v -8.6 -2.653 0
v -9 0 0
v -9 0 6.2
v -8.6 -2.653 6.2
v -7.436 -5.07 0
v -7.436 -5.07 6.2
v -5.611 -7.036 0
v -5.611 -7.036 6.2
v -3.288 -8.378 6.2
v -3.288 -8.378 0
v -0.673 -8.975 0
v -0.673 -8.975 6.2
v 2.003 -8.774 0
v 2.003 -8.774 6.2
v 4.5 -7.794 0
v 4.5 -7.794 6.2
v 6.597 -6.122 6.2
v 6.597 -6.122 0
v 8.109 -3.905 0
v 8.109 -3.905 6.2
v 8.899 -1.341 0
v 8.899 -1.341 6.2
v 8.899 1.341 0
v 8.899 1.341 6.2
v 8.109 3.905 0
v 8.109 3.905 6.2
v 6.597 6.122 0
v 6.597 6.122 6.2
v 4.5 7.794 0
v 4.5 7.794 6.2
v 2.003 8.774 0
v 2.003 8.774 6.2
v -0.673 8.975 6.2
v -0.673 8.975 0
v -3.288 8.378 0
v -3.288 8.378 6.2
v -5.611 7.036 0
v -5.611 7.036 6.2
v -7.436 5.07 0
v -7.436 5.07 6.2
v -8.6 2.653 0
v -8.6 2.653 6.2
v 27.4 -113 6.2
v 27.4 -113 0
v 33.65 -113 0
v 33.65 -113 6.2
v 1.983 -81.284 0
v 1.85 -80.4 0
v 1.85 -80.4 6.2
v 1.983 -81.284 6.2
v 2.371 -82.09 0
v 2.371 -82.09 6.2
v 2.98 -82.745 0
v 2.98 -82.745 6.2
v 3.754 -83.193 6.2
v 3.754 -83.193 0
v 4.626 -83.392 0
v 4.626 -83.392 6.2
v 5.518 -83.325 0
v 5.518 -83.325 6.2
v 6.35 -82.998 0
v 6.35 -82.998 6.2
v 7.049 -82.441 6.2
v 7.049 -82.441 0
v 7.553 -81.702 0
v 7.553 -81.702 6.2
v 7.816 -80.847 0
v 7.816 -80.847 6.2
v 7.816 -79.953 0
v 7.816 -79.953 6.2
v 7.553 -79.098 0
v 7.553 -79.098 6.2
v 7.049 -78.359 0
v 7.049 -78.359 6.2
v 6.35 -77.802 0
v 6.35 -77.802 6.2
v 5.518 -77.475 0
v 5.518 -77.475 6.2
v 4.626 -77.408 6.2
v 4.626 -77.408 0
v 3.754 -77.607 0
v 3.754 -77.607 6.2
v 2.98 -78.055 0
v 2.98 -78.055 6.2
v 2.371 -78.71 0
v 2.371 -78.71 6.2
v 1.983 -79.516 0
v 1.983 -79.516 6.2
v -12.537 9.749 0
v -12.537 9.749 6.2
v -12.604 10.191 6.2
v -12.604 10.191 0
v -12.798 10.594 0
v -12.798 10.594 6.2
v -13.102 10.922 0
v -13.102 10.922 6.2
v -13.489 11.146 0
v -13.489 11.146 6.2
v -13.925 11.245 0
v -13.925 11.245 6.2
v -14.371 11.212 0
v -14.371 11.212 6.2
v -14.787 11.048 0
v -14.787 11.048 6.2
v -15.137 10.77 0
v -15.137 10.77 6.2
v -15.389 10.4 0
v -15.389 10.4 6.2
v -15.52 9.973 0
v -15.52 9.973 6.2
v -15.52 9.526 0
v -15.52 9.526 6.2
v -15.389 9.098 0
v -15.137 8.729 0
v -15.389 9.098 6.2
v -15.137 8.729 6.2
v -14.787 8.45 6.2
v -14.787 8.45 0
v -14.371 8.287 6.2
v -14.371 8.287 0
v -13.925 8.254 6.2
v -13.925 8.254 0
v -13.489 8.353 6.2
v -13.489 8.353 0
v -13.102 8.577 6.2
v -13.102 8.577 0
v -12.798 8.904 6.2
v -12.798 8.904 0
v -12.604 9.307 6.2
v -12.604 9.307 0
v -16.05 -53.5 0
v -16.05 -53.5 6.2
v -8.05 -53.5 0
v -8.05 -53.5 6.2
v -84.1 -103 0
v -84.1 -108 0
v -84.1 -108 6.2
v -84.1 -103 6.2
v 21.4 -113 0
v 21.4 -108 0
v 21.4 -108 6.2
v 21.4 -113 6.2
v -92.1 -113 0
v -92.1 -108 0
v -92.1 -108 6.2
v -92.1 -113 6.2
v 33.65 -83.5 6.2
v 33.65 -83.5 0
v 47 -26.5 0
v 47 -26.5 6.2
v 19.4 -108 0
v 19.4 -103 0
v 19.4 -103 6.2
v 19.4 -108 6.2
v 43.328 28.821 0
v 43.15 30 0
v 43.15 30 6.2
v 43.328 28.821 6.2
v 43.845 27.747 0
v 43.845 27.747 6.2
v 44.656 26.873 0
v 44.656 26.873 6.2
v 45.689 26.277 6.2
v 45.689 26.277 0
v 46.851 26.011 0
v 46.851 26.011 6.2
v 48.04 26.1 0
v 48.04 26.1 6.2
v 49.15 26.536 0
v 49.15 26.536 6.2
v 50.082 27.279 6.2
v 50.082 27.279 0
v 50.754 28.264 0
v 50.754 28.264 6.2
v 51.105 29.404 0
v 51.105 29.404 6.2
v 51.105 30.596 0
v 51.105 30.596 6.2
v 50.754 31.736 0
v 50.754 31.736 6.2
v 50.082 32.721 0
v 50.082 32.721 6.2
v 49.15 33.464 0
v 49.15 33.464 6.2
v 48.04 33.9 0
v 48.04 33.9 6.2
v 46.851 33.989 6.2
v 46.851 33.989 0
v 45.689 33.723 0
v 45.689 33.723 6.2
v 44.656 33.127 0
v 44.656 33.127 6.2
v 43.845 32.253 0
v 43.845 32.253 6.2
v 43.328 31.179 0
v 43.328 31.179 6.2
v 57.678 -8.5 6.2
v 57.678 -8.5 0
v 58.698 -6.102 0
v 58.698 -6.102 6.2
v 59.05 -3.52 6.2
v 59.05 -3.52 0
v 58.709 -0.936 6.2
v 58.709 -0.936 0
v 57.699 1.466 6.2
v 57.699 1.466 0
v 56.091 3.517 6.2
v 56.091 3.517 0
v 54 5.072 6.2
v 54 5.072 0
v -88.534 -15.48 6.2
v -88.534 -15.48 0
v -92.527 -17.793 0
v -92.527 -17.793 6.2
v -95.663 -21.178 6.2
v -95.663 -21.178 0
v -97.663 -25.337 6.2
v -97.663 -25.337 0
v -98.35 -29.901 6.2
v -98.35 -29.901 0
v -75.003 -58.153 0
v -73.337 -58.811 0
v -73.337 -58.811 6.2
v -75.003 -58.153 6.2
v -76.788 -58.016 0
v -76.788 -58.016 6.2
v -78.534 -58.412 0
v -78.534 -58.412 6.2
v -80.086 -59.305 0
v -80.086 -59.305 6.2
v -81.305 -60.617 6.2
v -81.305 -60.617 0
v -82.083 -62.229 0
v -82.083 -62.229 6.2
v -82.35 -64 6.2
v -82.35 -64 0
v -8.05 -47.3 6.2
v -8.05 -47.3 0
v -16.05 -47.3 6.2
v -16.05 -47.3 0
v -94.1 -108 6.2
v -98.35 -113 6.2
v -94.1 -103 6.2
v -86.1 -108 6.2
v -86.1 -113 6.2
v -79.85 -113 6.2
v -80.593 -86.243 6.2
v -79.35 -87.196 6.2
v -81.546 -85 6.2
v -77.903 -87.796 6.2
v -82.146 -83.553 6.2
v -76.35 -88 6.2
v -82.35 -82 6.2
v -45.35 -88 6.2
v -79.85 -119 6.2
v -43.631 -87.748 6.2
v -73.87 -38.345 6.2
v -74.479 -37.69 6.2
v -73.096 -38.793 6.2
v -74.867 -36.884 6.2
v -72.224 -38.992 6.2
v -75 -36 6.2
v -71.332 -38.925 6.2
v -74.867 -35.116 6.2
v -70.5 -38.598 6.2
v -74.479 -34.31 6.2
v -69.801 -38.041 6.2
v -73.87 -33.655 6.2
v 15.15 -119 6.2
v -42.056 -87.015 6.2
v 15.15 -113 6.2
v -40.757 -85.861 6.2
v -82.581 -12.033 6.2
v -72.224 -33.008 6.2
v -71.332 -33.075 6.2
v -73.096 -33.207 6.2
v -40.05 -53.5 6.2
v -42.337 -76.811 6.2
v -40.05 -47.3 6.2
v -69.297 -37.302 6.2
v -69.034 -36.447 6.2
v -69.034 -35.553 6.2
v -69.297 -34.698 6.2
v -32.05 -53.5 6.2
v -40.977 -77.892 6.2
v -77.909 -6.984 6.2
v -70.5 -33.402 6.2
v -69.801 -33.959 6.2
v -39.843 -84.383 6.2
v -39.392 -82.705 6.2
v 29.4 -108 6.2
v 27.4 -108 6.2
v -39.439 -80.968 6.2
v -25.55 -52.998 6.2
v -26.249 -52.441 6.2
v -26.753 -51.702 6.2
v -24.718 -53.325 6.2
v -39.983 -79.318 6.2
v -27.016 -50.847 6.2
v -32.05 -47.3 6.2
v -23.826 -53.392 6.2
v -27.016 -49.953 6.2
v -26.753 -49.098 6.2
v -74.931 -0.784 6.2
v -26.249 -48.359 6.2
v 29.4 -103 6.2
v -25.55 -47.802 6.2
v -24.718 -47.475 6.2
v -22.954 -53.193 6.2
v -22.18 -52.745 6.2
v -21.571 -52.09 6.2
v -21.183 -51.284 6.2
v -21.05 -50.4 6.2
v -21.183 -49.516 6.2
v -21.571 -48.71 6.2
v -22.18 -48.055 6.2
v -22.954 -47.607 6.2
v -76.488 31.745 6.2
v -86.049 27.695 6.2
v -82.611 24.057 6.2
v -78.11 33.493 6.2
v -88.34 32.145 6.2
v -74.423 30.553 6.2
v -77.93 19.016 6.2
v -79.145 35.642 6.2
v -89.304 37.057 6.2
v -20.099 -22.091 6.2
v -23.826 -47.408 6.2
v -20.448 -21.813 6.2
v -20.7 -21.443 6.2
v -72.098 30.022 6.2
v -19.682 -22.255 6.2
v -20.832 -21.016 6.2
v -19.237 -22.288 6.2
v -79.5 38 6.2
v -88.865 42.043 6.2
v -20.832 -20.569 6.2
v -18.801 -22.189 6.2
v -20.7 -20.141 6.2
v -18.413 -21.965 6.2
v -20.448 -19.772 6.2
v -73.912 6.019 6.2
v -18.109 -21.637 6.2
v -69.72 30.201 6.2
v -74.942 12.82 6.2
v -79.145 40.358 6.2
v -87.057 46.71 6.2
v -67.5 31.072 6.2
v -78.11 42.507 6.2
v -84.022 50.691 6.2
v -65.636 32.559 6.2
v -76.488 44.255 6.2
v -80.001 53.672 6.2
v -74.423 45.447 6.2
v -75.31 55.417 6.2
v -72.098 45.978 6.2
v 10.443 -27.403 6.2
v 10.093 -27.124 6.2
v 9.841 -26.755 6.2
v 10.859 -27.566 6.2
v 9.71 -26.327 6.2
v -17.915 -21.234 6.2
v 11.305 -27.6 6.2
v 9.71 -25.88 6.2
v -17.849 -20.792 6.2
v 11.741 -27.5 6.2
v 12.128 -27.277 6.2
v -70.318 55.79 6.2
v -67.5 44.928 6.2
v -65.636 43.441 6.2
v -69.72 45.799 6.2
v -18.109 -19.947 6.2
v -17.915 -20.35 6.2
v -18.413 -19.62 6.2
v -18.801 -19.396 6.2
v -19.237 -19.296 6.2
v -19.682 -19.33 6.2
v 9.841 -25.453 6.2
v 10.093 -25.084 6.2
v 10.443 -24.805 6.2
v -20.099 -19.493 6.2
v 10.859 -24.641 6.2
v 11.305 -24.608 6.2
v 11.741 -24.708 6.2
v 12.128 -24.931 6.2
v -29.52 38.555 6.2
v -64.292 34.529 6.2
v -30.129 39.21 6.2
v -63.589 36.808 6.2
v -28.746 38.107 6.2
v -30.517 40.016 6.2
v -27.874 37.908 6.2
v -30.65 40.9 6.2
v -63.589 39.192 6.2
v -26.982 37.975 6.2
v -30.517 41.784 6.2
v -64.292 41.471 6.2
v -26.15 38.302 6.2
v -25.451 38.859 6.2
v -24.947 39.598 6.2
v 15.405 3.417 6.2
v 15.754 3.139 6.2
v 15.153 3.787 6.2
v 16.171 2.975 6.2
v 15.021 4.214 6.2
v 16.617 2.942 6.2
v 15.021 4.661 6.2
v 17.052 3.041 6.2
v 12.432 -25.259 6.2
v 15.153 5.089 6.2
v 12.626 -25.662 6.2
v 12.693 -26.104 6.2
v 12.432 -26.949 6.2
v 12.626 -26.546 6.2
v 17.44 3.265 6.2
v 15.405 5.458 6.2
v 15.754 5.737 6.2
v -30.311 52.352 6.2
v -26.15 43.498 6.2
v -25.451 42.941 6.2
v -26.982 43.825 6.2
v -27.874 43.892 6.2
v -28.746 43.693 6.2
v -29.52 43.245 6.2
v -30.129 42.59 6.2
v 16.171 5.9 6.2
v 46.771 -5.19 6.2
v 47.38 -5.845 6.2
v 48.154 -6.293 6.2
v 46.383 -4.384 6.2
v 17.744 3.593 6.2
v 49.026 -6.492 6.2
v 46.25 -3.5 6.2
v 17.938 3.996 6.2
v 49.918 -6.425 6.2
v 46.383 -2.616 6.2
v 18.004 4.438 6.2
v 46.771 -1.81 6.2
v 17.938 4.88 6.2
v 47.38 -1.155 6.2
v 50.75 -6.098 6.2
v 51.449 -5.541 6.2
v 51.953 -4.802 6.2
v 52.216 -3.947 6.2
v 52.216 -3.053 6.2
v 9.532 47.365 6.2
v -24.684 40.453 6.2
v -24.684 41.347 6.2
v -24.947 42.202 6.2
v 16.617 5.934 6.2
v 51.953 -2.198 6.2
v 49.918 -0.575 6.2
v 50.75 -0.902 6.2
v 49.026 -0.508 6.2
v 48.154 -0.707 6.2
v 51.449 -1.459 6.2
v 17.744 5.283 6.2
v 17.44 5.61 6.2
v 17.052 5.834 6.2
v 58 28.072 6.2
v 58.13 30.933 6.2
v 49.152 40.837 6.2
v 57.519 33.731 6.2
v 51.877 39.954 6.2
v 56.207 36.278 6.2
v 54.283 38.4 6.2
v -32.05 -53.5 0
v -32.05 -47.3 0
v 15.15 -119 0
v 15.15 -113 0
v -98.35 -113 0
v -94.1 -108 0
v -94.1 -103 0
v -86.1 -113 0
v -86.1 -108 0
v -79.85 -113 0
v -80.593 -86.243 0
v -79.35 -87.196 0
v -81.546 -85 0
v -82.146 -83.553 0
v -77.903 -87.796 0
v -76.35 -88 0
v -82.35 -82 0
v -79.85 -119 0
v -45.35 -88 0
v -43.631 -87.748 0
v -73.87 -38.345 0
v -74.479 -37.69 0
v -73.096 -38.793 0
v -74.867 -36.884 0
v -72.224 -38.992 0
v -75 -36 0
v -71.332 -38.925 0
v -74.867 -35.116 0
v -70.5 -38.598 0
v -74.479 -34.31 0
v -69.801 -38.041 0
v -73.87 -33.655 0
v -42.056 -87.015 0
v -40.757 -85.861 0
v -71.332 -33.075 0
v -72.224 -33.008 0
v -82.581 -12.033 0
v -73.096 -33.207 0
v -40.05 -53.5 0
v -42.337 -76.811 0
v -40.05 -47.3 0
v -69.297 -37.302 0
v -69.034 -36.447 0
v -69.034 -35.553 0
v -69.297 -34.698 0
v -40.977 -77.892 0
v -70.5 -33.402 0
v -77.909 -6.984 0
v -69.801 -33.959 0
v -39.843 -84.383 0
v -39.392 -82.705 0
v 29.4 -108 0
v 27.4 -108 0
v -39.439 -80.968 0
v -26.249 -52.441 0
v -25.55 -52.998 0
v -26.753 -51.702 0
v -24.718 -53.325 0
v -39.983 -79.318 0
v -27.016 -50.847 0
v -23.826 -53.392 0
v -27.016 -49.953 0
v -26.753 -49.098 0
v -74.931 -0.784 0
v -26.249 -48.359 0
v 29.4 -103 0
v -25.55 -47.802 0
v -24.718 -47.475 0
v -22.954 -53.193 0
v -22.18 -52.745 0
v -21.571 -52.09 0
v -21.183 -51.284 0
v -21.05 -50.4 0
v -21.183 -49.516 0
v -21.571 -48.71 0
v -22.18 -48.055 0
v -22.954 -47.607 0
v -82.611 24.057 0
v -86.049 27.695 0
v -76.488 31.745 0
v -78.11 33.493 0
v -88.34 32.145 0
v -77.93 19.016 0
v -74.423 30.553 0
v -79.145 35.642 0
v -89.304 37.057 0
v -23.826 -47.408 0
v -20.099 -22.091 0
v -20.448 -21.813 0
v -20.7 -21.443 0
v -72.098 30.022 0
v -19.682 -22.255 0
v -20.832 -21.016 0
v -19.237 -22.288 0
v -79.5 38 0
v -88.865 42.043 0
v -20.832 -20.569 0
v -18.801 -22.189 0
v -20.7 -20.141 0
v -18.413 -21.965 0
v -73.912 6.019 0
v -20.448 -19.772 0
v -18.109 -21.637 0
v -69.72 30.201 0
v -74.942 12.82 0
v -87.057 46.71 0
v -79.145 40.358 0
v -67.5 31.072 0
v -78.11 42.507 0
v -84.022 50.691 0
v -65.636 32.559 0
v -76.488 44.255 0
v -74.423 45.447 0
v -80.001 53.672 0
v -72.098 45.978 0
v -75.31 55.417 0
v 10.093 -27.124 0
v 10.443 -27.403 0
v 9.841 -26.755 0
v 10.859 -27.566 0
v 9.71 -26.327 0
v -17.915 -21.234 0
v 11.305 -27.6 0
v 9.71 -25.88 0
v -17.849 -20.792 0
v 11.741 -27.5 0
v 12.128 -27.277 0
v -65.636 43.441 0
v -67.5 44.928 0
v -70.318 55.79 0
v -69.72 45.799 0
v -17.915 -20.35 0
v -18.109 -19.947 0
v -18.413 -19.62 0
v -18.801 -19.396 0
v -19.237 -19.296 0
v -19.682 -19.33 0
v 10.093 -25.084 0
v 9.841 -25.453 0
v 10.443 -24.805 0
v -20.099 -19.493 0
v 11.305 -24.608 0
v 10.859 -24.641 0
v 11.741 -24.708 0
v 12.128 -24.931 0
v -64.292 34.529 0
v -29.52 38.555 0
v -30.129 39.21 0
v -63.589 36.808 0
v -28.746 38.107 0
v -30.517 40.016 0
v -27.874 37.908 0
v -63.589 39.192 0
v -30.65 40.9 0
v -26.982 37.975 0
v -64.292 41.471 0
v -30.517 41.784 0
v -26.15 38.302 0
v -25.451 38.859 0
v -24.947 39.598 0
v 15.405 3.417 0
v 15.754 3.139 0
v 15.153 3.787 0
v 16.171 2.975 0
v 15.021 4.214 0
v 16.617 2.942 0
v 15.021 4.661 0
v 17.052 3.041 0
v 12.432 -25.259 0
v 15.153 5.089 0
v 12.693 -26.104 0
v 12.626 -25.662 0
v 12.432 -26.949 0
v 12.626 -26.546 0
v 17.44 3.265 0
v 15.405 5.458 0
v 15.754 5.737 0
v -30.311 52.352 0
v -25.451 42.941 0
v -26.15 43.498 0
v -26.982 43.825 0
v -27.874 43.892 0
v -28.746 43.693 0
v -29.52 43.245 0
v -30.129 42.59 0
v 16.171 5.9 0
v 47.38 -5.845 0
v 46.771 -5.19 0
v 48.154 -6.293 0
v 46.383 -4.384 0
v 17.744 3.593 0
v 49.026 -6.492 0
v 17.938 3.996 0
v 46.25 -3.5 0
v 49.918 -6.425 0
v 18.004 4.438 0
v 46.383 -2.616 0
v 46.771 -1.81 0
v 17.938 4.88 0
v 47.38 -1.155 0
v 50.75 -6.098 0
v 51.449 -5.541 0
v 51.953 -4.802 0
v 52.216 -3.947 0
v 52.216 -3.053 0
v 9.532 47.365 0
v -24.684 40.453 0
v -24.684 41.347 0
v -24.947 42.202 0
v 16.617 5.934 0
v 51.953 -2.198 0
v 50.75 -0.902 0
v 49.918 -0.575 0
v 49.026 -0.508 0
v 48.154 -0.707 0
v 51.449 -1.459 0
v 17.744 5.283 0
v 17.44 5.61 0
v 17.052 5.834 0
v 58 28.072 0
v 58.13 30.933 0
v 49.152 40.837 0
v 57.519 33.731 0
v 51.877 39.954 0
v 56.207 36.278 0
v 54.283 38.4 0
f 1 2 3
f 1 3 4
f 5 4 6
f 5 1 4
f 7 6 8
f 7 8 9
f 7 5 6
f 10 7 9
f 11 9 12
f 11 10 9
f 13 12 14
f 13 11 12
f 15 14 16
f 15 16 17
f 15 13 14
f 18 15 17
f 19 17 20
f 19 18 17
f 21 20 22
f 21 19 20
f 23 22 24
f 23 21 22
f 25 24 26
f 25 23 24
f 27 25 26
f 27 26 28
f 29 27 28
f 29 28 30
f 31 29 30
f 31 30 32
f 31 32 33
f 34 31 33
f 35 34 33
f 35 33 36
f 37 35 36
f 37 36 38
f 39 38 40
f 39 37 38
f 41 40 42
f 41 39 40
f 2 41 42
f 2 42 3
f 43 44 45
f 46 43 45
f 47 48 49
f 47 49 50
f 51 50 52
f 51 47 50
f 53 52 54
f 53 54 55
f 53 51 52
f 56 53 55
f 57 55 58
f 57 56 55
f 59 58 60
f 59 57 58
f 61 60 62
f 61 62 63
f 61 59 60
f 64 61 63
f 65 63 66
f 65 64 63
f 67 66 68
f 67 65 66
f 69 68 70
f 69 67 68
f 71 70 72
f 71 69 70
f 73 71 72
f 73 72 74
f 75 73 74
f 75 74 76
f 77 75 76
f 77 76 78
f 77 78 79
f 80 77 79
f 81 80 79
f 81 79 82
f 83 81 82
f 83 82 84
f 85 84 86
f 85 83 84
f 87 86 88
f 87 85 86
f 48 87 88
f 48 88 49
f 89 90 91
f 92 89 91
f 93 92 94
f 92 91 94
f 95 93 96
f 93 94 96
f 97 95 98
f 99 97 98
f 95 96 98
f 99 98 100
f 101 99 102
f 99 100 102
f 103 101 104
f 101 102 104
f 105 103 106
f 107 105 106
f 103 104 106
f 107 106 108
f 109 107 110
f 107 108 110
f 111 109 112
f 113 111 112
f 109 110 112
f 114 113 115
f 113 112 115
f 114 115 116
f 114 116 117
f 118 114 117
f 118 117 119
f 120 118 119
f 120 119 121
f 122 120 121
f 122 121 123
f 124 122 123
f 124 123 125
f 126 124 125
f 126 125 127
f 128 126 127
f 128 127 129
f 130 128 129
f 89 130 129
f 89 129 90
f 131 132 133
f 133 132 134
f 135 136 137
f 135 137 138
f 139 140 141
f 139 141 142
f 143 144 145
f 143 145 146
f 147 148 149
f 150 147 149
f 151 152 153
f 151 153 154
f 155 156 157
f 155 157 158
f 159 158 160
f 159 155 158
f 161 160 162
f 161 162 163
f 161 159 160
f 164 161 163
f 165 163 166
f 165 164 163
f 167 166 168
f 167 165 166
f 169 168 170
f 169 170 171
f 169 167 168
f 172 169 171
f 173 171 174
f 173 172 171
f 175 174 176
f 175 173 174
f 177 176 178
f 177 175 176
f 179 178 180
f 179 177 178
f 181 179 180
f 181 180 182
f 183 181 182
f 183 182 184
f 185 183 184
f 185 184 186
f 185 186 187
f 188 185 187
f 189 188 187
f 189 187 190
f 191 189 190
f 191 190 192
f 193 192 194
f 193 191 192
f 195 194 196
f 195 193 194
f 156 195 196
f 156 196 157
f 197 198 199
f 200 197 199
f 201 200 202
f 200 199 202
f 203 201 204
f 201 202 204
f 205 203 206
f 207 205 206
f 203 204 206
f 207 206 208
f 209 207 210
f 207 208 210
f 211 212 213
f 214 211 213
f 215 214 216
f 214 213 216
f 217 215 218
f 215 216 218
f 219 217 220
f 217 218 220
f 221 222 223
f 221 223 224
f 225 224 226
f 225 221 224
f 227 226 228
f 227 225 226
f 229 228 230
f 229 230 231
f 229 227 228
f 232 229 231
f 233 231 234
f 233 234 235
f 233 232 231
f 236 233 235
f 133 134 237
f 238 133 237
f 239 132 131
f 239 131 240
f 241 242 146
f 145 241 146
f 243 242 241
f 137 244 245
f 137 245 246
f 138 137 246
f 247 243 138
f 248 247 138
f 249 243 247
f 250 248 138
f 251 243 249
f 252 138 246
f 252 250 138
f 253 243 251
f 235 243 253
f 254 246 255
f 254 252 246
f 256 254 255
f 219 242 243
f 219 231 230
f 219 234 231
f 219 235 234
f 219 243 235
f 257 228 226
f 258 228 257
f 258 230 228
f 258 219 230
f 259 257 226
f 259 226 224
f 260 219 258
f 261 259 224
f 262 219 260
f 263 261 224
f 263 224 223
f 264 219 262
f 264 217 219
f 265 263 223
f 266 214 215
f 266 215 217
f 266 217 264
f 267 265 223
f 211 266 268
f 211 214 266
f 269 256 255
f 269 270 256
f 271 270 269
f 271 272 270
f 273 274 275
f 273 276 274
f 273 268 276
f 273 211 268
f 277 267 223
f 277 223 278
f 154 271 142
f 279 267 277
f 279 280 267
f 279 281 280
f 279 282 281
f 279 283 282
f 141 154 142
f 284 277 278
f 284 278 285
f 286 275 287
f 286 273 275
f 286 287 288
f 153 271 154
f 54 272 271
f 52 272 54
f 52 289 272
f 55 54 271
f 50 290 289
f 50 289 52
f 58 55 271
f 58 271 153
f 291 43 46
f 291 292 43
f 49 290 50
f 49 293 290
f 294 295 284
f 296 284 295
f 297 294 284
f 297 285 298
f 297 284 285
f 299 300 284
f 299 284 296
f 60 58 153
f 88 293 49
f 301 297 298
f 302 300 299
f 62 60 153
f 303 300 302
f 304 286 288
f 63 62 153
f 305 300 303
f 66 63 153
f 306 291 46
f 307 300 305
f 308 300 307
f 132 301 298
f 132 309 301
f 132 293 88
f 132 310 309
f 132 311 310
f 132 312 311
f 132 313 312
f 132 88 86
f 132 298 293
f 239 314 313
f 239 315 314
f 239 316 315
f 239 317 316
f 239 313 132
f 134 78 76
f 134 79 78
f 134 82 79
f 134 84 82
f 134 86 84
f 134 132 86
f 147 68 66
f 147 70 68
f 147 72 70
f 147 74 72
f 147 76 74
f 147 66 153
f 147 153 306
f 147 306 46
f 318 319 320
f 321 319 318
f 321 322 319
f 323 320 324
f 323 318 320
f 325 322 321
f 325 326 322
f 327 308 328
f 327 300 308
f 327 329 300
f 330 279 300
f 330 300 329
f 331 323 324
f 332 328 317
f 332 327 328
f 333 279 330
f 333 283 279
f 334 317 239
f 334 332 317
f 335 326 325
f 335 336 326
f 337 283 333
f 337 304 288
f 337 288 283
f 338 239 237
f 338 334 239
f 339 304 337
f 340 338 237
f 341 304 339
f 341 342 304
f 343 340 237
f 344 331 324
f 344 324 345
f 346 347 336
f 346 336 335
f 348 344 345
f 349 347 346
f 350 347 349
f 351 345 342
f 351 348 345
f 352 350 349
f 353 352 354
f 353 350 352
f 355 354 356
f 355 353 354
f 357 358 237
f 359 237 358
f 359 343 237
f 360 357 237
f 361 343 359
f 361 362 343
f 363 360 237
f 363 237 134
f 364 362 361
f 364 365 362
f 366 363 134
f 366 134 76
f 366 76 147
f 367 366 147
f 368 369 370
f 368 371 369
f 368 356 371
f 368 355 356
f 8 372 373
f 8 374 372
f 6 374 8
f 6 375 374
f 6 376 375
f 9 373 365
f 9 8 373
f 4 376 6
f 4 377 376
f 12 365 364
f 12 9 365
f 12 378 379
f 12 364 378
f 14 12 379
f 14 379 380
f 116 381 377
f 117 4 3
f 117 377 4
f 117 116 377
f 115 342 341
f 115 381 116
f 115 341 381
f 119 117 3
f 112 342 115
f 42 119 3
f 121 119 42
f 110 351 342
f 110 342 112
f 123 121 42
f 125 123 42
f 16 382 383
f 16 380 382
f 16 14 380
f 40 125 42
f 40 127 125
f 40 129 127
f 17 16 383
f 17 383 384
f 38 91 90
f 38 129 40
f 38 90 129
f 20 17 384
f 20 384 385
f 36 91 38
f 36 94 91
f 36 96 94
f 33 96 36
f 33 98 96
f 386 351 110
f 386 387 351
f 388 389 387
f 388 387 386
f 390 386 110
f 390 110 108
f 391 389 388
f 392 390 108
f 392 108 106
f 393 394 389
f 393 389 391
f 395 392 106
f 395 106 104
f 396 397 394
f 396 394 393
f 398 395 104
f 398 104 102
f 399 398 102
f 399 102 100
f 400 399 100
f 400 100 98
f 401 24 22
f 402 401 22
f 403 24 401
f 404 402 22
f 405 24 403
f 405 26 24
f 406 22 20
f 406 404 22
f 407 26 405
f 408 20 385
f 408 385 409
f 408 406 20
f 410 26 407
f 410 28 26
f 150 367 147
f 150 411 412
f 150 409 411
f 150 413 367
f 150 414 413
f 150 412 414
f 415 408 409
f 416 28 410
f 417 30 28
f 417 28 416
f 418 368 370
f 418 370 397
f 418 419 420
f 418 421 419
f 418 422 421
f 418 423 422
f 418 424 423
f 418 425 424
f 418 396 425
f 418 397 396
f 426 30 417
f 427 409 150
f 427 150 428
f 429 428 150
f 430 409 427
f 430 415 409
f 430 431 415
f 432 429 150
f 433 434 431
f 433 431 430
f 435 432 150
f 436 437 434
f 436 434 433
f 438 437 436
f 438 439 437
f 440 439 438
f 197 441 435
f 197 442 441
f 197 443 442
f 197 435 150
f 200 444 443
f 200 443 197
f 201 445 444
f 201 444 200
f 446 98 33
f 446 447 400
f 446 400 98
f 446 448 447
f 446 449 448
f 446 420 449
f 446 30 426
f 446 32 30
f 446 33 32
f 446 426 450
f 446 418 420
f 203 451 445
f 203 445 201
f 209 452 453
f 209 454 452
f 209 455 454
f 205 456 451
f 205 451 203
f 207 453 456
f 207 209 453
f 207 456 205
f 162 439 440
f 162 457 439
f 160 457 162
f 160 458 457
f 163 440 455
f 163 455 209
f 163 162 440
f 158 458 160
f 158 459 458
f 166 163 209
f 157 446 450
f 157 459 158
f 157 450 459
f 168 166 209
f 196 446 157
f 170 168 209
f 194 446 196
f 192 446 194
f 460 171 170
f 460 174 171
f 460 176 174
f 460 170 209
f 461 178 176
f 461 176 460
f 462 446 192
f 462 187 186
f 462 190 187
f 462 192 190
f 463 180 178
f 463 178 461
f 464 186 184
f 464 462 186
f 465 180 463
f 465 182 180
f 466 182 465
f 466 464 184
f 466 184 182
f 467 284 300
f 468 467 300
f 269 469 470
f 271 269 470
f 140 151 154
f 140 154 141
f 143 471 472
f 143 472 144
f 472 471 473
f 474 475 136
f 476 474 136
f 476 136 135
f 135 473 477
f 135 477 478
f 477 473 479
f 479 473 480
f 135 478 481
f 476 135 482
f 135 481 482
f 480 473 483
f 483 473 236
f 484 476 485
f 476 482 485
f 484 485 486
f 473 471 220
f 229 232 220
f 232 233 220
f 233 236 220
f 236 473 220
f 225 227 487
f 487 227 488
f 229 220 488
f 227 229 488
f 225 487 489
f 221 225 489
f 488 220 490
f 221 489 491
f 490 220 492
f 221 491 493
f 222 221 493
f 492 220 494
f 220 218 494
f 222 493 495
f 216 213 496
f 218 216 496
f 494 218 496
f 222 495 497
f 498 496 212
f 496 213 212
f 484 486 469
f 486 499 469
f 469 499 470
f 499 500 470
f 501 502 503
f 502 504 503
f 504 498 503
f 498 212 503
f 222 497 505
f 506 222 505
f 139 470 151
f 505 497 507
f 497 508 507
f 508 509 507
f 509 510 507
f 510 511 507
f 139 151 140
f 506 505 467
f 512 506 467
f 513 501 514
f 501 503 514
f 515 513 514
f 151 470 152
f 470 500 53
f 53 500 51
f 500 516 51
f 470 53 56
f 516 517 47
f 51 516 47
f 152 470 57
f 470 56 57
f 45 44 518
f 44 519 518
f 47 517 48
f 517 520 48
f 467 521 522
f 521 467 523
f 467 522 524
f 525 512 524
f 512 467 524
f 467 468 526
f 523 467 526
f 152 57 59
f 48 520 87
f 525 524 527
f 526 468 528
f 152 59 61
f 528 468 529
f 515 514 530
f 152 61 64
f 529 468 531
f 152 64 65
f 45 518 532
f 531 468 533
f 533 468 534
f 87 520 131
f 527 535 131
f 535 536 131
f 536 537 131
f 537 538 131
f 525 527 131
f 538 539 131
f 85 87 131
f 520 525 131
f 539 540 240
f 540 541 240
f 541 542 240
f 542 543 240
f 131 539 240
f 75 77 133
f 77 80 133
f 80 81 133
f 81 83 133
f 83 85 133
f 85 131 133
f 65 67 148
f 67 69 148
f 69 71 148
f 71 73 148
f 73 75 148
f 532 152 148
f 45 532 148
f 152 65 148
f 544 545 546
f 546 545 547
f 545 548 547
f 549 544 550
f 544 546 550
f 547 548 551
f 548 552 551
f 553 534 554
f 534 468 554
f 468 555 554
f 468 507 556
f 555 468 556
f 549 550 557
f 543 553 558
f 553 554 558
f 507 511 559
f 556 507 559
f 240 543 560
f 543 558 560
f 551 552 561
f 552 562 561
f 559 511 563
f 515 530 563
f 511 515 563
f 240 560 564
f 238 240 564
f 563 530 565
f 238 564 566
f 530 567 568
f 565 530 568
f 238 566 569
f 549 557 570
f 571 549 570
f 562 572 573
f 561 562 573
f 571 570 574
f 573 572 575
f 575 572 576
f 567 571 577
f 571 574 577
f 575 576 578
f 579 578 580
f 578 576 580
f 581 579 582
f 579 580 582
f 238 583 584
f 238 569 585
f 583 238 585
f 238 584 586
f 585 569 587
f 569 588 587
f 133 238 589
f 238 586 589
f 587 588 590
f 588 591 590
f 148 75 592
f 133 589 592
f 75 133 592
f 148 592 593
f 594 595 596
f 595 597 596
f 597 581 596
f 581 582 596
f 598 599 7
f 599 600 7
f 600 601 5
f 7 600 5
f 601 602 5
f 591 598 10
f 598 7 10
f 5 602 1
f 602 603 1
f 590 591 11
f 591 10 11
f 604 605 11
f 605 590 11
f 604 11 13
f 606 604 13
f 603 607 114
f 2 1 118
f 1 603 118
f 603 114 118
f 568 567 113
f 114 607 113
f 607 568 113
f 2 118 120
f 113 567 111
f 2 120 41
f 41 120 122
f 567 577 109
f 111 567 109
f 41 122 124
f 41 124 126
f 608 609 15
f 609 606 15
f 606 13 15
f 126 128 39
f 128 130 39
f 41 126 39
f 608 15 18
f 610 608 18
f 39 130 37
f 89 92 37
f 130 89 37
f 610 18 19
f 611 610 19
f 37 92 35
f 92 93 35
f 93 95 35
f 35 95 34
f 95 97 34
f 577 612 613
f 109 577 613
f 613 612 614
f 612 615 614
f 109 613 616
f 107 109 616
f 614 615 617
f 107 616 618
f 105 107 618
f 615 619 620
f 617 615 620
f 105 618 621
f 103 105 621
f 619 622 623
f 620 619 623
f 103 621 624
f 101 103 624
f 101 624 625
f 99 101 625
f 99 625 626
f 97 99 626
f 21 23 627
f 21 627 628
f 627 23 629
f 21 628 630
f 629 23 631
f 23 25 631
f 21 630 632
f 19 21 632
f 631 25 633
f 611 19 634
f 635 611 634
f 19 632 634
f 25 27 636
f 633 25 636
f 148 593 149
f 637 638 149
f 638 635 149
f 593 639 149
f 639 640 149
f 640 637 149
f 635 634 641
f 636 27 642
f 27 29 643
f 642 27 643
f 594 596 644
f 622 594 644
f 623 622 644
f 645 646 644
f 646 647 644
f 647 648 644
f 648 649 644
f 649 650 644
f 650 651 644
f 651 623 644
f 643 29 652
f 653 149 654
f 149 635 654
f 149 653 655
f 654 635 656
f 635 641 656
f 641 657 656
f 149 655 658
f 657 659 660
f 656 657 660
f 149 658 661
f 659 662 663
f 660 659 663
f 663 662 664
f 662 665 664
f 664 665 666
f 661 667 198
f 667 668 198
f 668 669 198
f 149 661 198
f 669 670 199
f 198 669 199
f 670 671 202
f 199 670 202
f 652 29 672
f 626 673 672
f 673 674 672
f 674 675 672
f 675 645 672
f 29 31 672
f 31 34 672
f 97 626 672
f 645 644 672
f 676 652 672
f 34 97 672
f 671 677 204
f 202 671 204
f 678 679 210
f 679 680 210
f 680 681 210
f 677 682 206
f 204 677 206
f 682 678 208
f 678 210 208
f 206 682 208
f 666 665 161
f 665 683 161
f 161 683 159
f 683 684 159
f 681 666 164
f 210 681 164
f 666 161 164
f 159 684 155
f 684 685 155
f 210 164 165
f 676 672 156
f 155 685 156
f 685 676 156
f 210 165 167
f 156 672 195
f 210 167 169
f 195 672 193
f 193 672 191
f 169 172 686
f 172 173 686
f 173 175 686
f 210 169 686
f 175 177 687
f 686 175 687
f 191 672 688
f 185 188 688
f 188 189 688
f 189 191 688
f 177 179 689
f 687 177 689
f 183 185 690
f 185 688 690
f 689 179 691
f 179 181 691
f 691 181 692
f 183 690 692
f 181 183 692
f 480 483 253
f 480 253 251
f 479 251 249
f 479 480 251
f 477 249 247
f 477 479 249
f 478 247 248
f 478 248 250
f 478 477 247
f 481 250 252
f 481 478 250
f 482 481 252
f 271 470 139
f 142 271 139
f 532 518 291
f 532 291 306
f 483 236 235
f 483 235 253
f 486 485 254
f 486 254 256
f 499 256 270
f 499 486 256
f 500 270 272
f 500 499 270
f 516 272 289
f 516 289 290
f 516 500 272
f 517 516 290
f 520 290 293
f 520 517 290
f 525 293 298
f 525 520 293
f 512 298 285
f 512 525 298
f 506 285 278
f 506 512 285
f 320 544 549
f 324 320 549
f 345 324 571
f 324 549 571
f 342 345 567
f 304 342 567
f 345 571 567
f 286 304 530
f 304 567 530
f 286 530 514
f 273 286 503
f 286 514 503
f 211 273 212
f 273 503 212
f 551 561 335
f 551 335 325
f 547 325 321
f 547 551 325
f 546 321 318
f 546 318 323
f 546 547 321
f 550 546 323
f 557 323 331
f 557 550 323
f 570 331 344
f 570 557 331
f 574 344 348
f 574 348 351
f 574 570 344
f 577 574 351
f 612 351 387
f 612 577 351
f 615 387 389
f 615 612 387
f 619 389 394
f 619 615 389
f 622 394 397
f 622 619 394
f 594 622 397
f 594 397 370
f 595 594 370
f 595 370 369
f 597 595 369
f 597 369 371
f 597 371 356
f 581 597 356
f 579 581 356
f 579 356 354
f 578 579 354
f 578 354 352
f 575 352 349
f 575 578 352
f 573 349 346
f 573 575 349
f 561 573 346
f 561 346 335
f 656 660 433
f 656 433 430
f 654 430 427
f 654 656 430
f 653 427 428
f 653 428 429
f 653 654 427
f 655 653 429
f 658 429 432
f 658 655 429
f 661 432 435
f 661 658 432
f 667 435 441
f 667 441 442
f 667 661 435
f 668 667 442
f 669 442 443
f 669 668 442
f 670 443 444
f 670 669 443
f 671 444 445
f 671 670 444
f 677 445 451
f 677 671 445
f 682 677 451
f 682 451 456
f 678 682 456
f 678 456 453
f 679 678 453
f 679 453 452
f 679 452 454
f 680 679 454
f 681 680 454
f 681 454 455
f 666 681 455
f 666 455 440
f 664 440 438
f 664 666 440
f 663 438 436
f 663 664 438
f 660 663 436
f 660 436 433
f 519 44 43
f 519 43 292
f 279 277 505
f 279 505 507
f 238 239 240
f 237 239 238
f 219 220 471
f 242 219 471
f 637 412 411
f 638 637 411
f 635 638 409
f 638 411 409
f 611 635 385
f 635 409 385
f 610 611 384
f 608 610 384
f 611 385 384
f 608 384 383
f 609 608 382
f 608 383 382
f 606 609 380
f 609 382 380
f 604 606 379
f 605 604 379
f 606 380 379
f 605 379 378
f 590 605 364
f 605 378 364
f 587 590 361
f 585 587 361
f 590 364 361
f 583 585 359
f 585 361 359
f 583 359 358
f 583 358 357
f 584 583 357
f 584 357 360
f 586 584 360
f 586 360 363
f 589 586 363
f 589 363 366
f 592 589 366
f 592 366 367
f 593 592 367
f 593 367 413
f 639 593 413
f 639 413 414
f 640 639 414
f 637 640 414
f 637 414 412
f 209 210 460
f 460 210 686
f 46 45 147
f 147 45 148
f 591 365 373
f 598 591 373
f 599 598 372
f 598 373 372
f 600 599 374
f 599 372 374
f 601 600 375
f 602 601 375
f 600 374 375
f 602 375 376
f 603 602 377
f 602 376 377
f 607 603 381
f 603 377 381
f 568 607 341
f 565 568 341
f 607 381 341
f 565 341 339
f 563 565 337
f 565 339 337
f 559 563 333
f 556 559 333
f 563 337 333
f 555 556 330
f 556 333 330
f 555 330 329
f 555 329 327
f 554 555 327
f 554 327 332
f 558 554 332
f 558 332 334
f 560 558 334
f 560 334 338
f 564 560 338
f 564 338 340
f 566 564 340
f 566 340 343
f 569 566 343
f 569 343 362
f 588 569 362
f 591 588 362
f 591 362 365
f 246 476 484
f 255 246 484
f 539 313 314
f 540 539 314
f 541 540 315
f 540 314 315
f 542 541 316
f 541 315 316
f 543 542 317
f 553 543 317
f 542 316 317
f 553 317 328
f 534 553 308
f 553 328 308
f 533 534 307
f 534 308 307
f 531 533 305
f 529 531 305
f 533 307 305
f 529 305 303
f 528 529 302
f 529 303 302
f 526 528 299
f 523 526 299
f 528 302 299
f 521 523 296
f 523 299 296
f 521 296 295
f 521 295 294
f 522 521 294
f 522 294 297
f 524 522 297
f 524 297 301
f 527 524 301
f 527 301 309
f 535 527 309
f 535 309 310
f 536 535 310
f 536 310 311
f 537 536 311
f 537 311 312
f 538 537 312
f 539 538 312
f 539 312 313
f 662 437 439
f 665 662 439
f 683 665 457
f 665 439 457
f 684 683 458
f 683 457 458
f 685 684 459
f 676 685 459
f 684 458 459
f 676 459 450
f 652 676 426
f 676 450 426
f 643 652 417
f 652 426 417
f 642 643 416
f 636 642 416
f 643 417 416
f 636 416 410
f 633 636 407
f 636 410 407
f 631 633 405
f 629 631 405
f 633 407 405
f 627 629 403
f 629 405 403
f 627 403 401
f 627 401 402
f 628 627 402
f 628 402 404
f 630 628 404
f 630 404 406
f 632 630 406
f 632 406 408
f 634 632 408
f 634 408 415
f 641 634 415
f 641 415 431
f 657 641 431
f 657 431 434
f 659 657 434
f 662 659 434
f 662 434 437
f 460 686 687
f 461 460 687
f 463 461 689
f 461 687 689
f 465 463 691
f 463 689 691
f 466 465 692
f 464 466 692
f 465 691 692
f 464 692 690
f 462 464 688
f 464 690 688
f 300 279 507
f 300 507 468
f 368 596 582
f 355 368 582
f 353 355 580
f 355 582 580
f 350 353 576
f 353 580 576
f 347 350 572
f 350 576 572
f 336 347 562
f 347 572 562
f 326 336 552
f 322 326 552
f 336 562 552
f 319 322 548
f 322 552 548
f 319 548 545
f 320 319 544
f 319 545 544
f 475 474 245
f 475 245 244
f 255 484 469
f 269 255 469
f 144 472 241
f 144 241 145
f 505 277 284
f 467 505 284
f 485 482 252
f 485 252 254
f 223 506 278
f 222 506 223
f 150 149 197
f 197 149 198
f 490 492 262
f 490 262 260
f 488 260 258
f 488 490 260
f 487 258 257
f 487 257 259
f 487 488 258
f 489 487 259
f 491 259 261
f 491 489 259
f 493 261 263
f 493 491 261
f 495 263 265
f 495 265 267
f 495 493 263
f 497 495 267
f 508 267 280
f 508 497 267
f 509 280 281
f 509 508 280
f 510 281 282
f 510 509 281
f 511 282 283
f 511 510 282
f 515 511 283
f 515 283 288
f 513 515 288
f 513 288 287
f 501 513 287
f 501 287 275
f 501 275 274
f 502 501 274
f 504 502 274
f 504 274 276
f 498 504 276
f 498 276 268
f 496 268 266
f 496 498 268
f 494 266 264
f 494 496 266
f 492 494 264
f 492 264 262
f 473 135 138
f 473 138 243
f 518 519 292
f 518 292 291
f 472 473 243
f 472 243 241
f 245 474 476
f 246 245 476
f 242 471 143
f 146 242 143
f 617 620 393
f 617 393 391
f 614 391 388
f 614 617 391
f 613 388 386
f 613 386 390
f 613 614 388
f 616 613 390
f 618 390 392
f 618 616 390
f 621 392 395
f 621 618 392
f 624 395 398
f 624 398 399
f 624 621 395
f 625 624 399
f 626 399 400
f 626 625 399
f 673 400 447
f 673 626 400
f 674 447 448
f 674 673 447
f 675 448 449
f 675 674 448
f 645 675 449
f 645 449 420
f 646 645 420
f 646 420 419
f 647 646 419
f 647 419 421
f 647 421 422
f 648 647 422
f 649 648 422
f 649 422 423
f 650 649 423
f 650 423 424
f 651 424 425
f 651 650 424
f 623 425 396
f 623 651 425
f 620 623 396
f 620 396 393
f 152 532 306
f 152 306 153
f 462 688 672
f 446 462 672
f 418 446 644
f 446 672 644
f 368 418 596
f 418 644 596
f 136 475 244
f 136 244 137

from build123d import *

# Parameters (mm, degrees)
SKETCH1_R           = 4
SKETCH1_R_2         = 8
SKETCH1_R_3         = 3
SKETCH1_R_4         = 9
BOSS_EXTRUDE1_DEPTH = 6.2
CUT_EXTRUDE1_REACH  = 156.506
SKETCH2_R           = 1.5
CUT_EXTRUDE2_REACH  = 156.506
CUT_EXTRUDE3_REACH  = 156.506
SKETCH4_R           = 3
SKETCH4_W           = 8
SKETCH4_H           = 6.2


with BuildPart() as part:
    # Sketch1 → Boss-Extrude1 (new body)
    with BuildSketch(Plane.XY):
        with BuildLine():
            Line((33.65, -83.5), (47, -26.5))
            Line((47, -26.5), (57.678304402, -8.5))
            ThreePointArc((57.678304402, -8.5), (58.708572703, -0.936463864), (54, 5.071686829))
            Line((54, 5.071686829), (58, 28.071686829))
            ThreePointArc((58, 28.071686829), (56.207110337, 36.277710094), (49.152329455, 40.836584722))
            ThreePointArc((49.152329455, 40.836584722), (-10.365453902, 50.052003716), (-70.318491494, 55.789927265))
            ThreePointArc((-70.318491494, 55.789927265), (-88.125314746, 44.440216148), (-82.611172846, 24.056567409))
            ThreePointArc((-82.611172846, 24.056567409), (-74.166284142, 2.579562371), (-88.533690885, -15.480213766))
            ThreePointArc((-88.533690885, -15.480213766), (-95.663024793, -21.178356395), (-98.35, -29.900534772))
            Line((-98.35, -29.900534772), (-98.35, -113))
            Line((-98.35, -113), (-79.85, -113))
            Line((-79.85, -113), (-79.85, -119))
            Line((-79.85, -119), (15.15, -119))
            Line((15.15, -119), (15.15, -113))
            Line((15.15, -113), (33.65, -113))
            Line((33.65, -113), (33.65, -83.5))
        make_face()
        with Locations(Location((47.15, 30, 0), (0, 0, 180))):
            Circle(SKETCH1_R, mode=Mode.SUBTRACT)
        with Locations(Location((-71.5, 38, 0), (0, 0, 180))):
            Circle(SKETCH1_R_2, mode=Mode.SUBTRACT)
        with Locations(Location((-27.65, 40.9, 0), (0, 0, 180))):
            Circle(SKETCH1_R_3, mode=Mode.SUBTRACT)
        with Locations(Location((4.85, -80.4, 0), (0, 0, 180))):
            Circle(SKETCH1_R_3, mode=Mode.SUBTRACT)
        with Locations(Location((49.25, -3.5, 0), (0, 0, 180))):
            Circle(SKETCH1_R_3, mode=Mode.SUBTRACT)
        with Locations(Location((-72, -36, 0), (0, 0, 180))):
            Circle(SKETCH1_R_3, mode=Mode.SUBTRACT)
        with Locations(Location((0, 0, 0), (0, 0, 180))):
            Circle(SKETCH1_R_4, mode=Mode.SUBTRACT)
        with BuildLine():
            Line((-82.35, -64), (-82.35, -82))
            ThreePointArc((-82.35, -82), (-80.592640687, -86.242640687), (-76.35, -88))
            Line((-76.35, -88), (-45.35, -88))
            ThreePointArc((-45.35, -88), (-39.556365472, -83.560063768), (-42.337186896, -76.81126632))
            Line((-42.337186896, -76.81126632), (-73.337186896, -58.81126632))
            ThreePointArc((-73.337186896, -58.81126632), (-79.343586593, -58.800150068), (-82.35, -64))
        make_face(mode=Mode.SUBTRACT)
    extrude(amount=BOSS_EXTRUDE1_DEPTH)

    # Sketch2 → Cut-Extrude1 (cut, up to next)
    with BuildSketch(Plane.XY.offset(6.2), mode=Mode.PRIVATE) as cut_extrude1_sk1:
        with Locations((-19.348702159, -20.792251556)):
            Circle(SKETCH2_R)
    cut_extrude1_tool1 = extrude(cut_extrude1_sk1.sketch, amount=-CUT_EXTRUDE1_REACH, mode=Mode.PRIVATE) & part.part
    # Sketch2 → Cut-Extrude1 (cut, up to next)
    with BuildSketch(Plane.XY.offset(6.2), mode=Mode.PRIVATE) as cut_extrude1_sk2:
        with Locations((11.192862241, -26.103827973)):
            Circle(SKETCH2_R)
    cut_extrude1_tool2 = extrude(cut_extrude1_sk2.sketch, amount=-CUT_EXTRUDE1_REACH, mode=Mode.PRIVATE) & part.part
    # Sketch2 → Cut-Extrude1 (cut, up to next)
    with BuildSketch(Plane.XY.offset(6.2), mode=Mode.PRIVATE) as cut_extrude1_sk3:
        with Locations((-14.037125741, 9.749312843)):
            Circle(SKETCH2_R)
    cut_extrude1_tool3 = extrude(cut_extrude1_sk3.sketch, amount=-CUT_EXTRUDE1_REACH, mode=Mode.PRIVATE) & part.part
    # Sketch2 → Cut-Extrude1 (cut, up to next)
    with BuildSketch(Plane.XY.offset(6.2), mode=Mode.PRIVATE) as cut_extrude1_sk4:
        with Locations((16.504438658, 4.437736426)):
            Circle(SKETCH2_R)
    cut_extrude1_tool4 = extrude(cut_extrude1_sk4.sketch, amount=-CUT_EXTRUDE1_REACH, mode=Mode.PRIVATE) & part.part
    add(cut_extrude1_tool1.solids().sort_by_distance((-19.348702, -20.792252, 6.2))[0], mode=Mode.SUBTRACT)
    add(cut_extrude1_tool2.solids().sort_by_distance((11.192862, -26.103828, 6.2))[0], mode=Mode.SUBTRACT)
    add(cut_extrude1_tool3.solids().sort_by_distance((-14.037126, 9.749313, 6.2))[0], mode=Mode.SUBTRACT)
    add(cut_extrude1_tool4.solids().sort_by_distance((16.504439, 4.437736, 6.2))[0], mode=Mode.SUBTRACT)

    # Sketch3 → Cut-Extrude2 (cut, up to next)
    with BuildSketch(Plane(origin=(0, 0, 0), x_dir=(-1, 0, 0), z_dir=(0, 0, -1)), mode=Mode.PRIVATE) as cut_extrude2_sk1:
        Polygon((-29.4, -103), (-19.4, -103), (-19.4, -108), (-21.4, -108), (-21.4, -113), (-27.4, -113), (-27.4, -108), (-29.4, -108), align=None)
    cut_extrude2_tool1 = extrude(cut_extrude2_sk1.sketch, amount=-CUT_EXTRUDE2_REACH, mode=Mode.PRIVATE) & part.part
    # Sketch3 → Cut-Extrude2 (cut, up to next)
    with BuildSketch(Plane(origin=(0, 0, 0), x_dir=(-1, 0, 0), z_dir=(0, 0, -1)), mode=Mode.PRIVATE) as cut_extrude2_sk2:
        Polygon((92.1, -113), (86.1, -113), (86.1, -108), (84.1, -108), (84.1, -103), (94.1, -103), (94.1, -108), (92.1, -108), align=None)
    cut_extrude2_tool2 = extrude(cut_extrude2_sk2.sketch, amount=-CUT_EXTRUDE2_REACH, mode=Mode.PRIVATE) & part.part
    add(cut_extrude2_tool1.solids().sort_by_distance((24.4, -107.375, 0))[0], mode=Mode.SUBTRACT)
    add(cut_extrude2_tool2.solids().sort_by_distance((-89.1, -107.375, 0))[0], mode=Mode.SUBTRACT)

    # Sketch4 → Cut-Extrude3 (cut, up to next)
    with BuildSketch(Plane.XY.offset(6.2), mode=Mode.PRIVATE) as cut_extrude3_sk1:
        with Locations((-24.05, -50.4)):
            Circle(SKETCH4_R)
    cut_extrude3_tool1 = extrude(cut_extrude3_sk1.sketch, amount=-CUT_EXTRUDE3_REACH, mode=Mode.PRIVATE) & part.part
    # Sketch4 → Cut-Extrude3 (cut, up to next)
    with BuildSketch(Plane.XY.offset(6.2), mode=Mode.PRIVATE) as cut_extrude3_sk2:
        with Locations((-36.05, -50.4)):
            Rectangle(SKETCH4_W, SKETCH4_H)
    cut_extrude3_tool2 = extrude(cut_extrude3_sk2.sketch, amount=-CUT_EXTRUDE3_REACH, mode=Mode.PRIVATE) & part.part
    # Sketch4 → Cut-Extrude3 (cut, up to next)
    with BuildSketch(Plane.XY.offset(6.2), mode=Mode.PRIVATE) as cut_extrude3_sk3:
        with Locations((-12.05, -50.4)):
            Rectangle(SKETCH4_W, SKETCH4_H)
    cut_extrude3_tool3 = extrude(cut_extrude3_sk3.sketch, amount=-CUT_EXTRUDE3_REACH, mode=Mode.PRIVATE) & part.part
    add(cut_extrude3_tool1.solids().sort_by_distance((-24.05, -50.4, 6.2))[0], mode=Mode.SUBTRACT)
    add(cut_extrude3_tool2.solids().sort_by_distance((-36.05, -50.4, 6.2))[0], mode=Mode.SUBTRACT)
    add(cut_extrude3_tool3.solids().sort_by_distance((-12.05, -50.4, 6.2))[0], mode=Mode.SUBTRACT)


solid = part.part
